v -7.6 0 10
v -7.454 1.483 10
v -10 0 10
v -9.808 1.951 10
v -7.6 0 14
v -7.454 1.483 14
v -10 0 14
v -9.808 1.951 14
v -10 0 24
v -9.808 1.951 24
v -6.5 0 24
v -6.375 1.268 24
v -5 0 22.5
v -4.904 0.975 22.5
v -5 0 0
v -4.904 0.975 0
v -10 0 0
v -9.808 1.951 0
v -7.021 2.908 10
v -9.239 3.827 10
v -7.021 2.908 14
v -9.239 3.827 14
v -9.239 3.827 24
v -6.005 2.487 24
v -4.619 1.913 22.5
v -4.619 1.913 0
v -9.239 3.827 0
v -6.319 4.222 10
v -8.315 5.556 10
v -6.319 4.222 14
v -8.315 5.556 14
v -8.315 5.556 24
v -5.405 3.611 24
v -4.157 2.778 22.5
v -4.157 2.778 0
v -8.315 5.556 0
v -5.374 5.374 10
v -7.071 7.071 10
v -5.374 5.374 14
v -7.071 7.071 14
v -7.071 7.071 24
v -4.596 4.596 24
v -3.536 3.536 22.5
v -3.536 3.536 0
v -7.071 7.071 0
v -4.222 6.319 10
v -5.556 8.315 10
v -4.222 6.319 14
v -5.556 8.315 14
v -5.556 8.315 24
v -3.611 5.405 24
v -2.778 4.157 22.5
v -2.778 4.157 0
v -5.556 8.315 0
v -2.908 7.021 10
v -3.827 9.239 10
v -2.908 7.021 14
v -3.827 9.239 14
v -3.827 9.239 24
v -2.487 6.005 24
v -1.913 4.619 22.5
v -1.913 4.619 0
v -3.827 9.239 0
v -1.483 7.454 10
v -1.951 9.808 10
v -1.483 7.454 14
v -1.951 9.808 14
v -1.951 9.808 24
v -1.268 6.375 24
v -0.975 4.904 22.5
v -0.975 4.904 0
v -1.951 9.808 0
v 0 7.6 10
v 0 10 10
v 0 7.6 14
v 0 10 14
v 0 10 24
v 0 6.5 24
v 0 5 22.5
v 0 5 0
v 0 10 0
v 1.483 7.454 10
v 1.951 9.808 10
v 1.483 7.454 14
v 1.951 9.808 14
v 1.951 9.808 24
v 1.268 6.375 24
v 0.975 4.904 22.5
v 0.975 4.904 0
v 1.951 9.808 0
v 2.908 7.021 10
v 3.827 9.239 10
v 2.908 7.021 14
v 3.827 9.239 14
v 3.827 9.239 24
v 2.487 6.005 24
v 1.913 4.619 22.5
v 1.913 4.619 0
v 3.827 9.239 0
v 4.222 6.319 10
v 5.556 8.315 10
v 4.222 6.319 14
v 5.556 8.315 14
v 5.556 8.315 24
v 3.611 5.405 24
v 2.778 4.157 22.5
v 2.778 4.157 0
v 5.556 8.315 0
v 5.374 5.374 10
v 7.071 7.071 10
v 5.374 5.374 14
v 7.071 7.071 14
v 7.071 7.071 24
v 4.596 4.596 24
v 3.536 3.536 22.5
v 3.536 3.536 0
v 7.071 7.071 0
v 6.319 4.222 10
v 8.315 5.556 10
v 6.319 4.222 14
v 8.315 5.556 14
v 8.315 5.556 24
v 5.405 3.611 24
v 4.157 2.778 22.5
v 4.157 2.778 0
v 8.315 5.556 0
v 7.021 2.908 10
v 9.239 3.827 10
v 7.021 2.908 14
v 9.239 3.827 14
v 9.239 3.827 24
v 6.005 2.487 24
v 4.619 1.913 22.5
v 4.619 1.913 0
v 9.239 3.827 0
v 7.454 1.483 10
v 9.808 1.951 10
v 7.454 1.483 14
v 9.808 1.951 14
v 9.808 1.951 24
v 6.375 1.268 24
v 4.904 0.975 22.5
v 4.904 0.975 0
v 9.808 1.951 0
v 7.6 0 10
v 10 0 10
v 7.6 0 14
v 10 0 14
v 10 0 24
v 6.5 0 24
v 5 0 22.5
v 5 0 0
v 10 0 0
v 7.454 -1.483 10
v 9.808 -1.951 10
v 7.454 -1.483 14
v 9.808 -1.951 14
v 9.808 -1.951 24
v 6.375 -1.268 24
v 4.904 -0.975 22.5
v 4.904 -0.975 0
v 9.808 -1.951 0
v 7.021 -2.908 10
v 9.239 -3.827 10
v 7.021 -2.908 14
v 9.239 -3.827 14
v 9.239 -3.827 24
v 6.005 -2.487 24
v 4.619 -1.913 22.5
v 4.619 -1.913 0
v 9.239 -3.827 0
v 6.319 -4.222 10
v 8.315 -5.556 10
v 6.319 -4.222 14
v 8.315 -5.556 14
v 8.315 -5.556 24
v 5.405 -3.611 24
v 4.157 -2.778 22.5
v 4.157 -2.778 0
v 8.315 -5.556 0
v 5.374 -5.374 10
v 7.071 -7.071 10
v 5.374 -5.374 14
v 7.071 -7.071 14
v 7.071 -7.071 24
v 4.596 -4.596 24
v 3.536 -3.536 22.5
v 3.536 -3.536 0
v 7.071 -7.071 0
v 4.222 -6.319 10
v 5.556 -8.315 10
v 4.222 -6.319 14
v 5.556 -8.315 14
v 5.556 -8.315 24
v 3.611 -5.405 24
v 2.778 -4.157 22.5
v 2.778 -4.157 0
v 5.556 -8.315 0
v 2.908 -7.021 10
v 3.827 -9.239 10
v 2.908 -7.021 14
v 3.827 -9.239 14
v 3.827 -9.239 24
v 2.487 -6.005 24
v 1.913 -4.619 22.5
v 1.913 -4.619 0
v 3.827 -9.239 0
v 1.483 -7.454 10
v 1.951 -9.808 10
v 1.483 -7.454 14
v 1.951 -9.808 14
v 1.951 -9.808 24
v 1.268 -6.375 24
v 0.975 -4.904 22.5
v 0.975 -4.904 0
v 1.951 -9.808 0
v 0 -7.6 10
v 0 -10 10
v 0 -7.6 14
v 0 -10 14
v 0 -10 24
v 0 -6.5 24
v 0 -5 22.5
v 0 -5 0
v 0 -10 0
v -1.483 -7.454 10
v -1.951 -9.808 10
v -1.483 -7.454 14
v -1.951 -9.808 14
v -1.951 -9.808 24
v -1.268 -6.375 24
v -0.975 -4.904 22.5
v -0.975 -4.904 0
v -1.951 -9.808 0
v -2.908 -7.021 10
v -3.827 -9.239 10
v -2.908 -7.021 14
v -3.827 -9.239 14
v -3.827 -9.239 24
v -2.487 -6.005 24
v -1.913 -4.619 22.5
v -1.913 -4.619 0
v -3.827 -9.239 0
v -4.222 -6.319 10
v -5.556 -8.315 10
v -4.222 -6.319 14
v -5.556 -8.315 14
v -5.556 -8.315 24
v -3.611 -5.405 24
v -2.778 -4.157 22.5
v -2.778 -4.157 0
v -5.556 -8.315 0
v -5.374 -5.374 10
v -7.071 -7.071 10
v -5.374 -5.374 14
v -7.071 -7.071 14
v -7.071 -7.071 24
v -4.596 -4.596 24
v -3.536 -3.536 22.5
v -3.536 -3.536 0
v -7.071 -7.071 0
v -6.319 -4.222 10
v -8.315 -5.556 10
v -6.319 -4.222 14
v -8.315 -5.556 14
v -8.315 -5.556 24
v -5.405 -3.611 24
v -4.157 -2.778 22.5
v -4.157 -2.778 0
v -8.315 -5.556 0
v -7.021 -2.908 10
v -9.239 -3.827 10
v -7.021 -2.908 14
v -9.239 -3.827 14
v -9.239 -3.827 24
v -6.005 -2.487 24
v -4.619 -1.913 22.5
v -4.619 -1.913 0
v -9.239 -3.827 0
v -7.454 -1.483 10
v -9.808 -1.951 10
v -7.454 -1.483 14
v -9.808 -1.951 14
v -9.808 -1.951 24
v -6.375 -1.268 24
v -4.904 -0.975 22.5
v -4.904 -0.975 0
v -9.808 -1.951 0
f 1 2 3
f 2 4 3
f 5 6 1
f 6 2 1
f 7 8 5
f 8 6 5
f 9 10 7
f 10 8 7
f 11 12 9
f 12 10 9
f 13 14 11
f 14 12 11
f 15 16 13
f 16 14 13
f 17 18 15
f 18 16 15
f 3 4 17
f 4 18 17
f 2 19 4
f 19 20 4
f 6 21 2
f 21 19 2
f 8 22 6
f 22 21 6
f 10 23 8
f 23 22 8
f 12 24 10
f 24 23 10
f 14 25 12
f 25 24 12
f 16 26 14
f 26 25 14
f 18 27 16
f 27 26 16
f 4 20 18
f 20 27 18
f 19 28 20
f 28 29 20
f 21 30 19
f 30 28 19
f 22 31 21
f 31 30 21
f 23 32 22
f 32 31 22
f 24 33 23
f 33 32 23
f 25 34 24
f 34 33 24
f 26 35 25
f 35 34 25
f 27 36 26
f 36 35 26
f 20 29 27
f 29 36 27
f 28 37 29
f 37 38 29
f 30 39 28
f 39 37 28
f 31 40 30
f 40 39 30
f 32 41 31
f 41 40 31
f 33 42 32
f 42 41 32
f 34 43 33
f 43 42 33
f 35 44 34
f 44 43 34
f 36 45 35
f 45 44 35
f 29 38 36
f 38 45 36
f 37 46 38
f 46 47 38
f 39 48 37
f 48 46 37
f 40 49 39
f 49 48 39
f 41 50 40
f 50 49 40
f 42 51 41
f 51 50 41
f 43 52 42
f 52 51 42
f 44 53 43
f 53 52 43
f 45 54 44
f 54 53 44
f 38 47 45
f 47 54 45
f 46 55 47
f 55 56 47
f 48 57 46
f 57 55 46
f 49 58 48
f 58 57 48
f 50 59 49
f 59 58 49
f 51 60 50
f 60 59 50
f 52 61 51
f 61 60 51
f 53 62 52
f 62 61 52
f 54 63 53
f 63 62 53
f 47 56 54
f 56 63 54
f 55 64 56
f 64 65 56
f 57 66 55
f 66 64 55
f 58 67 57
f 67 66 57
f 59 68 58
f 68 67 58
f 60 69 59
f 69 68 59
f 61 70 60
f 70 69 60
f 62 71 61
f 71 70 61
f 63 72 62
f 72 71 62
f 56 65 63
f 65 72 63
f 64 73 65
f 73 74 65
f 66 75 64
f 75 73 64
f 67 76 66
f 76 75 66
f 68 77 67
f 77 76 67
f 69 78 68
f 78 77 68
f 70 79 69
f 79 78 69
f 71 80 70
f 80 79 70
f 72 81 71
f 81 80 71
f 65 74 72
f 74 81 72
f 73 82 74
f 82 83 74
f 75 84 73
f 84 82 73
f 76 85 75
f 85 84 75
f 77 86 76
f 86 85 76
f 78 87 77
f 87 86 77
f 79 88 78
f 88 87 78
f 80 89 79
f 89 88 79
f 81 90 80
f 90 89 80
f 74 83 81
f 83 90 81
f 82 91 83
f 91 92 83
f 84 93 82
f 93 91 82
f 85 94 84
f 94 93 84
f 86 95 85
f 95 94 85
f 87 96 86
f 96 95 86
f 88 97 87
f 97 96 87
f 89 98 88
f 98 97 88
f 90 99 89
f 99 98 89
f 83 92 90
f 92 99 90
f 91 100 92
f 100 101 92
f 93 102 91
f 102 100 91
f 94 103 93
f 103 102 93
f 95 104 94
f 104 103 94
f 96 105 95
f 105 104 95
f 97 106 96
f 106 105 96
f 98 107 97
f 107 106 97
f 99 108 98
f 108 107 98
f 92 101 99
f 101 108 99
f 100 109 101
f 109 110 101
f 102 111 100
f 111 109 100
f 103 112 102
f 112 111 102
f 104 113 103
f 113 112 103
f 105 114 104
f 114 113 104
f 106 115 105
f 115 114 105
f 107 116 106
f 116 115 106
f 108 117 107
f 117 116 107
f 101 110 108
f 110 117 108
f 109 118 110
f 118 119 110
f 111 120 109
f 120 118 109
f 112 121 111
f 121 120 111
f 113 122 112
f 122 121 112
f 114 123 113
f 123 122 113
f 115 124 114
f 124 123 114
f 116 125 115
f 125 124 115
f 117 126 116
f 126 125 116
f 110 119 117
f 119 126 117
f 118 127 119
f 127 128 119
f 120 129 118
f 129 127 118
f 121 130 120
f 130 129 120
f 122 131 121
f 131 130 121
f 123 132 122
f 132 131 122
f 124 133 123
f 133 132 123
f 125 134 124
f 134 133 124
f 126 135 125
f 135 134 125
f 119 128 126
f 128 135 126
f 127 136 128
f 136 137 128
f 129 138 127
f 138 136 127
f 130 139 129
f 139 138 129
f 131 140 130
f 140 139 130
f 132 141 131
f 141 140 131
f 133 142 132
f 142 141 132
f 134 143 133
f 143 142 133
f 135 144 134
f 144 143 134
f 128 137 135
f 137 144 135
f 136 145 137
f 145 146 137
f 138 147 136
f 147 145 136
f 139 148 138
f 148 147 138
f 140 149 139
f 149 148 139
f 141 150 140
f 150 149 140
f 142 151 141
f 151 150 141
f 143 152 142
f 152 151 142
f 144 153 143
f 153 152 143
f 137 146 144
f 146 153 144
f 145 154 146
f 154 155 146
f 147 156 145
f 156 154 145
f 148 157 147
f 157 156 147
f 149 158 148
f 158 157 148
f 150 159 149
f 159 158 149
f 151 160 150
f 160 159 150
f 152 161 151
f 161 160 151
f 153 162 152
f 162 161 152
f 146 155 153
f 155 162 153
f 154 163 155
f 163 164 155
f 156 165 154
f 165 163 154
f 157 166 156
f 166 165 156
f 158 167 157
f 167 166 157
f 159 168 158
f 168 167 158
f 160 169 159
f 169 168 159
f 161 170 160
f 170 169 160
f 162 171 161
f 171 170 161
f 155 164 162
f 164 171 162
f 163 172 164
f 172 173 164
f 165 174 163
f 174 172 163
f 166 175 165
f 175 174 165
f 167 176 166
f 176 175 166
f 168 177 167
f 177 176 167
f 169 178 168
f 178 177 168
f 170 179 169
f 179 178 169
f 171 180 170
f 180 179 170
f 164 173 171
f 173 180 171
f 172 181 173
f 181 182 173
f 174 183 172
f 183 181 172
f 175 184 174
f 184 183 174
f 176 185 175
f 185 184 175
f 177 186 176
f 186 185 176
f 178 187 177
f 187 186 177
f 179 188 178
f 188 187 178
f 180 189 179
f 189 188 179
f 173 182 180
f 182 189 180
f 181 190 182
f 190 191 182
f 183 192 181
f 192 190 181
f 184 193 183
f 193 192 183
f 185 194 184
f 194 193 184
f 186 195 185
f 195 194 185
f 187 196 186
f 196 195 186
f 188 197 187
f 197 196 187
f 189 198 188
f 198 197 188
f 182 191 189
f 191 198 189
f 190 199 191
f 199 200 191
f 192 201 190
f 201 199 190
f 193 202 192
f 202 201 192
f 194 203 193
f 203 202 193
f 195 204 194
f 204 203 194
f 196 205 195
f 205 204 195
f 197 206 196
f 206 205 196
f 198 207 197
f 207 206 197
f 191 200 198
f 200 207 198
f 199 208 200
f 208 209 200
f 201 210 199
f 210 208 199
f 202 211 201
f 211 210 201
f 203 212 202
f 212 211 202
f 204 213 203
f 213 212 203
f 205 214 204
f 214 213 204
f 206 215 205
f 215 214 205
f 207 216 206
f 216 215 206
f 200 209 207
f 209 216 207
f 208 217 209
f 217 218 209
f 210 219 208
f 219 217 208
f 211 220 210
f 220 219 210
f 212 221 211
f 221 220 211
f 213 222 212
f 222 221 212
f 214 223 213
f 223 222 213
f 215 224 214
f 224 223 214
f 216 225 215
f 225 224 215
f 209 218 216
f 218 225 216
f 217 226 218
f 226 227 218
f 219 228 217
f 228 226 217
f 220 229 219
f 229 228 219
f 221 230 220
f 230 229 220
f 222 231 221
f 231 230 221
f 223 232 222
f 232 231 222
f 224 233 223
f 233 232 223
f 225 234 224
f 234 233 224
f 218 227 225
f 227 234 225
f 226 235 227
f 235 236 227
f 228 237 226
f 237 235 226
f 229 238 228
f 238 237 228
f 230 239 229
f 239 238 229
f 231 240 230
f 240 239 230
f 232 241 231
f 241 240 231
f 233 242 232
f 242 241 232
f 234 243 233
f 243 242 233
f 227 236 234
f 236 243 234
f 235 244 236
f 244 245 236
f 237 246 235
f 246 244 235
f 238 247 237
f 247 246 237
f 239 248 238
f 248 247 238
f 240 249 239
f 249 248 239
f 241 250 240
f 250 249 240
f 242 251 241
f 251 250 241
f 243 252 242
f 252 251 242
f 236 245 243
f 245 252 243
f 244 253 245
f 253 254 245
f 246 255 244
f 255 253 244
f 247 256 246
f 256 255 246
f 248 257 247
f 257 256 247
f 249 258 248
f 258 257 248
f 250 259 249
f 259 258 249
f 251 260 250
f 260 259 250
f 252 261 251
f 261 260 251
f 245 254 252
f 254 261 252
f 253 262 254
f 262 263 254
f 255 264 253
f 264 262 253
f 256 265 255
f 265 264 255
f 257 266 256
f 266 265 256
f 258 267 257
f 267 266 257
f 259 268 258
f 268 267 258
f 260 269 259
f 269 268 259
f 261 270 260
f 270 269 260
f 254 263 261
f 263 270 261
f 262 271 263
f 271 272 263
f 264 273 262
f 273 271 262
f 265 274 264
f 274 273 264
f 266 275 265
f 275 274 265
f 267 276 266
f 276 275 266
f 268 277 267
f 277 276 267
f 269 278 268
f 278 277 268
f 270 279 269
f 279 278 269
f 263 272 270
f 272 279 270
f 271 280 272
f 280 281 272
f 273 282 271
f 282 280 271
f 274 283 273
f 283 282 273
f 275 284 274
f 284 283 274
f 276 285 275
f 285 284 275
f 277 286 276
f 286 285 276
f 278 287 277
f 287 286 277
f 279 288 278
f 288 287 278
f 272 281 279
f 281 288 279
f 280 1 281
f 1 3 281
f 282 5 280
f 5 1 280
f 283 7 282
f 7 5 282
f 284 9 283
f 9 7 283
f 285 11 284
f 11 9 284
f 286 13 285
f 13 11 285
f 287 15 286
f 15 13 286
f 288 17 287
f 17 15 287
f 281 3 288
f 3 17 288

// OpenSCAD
$fn = 32;

// ----------------------------------------------------------------------
// Grooved revolve: thread_relief, bore R5
// ----------------------------------------------------------------------

// --- parameters (mm) ---
bore_r = 5;               // bore radius
outer_r = 10;             // outer radius of the body
total_h = 24;             // overall height, Z
wall = 5;                 // radial wall thickness
groove_w = 4;             // groove width
groove_d = 2.4;           // groove depth
grooves = 1;              // number of outer grooves
relief = 1.5;             // thread relief leg at the bore mouth
relief_angle = 45;        // thread relief chamfer angle, degrees

bbox_x = 2 * outer_r;  // full diameter
bore_d = 2 * bore_r;  // bore diameter
body_d = 2 * outer_r;  // body diameter
revolve_angle = 360;  // full turn around the Z axis

profile = [[5, 0], [10, 0], [10, 10], [7.6, 10], [7.6, 14], [10, 14], [10, 24], [6.5, 24], [5, 22.5]];  // primary outline, 9 points, counter clockwise

// --- the one profile operation ---
rotate_extrude(angle = revolve_angle) polygon(points = profile);
